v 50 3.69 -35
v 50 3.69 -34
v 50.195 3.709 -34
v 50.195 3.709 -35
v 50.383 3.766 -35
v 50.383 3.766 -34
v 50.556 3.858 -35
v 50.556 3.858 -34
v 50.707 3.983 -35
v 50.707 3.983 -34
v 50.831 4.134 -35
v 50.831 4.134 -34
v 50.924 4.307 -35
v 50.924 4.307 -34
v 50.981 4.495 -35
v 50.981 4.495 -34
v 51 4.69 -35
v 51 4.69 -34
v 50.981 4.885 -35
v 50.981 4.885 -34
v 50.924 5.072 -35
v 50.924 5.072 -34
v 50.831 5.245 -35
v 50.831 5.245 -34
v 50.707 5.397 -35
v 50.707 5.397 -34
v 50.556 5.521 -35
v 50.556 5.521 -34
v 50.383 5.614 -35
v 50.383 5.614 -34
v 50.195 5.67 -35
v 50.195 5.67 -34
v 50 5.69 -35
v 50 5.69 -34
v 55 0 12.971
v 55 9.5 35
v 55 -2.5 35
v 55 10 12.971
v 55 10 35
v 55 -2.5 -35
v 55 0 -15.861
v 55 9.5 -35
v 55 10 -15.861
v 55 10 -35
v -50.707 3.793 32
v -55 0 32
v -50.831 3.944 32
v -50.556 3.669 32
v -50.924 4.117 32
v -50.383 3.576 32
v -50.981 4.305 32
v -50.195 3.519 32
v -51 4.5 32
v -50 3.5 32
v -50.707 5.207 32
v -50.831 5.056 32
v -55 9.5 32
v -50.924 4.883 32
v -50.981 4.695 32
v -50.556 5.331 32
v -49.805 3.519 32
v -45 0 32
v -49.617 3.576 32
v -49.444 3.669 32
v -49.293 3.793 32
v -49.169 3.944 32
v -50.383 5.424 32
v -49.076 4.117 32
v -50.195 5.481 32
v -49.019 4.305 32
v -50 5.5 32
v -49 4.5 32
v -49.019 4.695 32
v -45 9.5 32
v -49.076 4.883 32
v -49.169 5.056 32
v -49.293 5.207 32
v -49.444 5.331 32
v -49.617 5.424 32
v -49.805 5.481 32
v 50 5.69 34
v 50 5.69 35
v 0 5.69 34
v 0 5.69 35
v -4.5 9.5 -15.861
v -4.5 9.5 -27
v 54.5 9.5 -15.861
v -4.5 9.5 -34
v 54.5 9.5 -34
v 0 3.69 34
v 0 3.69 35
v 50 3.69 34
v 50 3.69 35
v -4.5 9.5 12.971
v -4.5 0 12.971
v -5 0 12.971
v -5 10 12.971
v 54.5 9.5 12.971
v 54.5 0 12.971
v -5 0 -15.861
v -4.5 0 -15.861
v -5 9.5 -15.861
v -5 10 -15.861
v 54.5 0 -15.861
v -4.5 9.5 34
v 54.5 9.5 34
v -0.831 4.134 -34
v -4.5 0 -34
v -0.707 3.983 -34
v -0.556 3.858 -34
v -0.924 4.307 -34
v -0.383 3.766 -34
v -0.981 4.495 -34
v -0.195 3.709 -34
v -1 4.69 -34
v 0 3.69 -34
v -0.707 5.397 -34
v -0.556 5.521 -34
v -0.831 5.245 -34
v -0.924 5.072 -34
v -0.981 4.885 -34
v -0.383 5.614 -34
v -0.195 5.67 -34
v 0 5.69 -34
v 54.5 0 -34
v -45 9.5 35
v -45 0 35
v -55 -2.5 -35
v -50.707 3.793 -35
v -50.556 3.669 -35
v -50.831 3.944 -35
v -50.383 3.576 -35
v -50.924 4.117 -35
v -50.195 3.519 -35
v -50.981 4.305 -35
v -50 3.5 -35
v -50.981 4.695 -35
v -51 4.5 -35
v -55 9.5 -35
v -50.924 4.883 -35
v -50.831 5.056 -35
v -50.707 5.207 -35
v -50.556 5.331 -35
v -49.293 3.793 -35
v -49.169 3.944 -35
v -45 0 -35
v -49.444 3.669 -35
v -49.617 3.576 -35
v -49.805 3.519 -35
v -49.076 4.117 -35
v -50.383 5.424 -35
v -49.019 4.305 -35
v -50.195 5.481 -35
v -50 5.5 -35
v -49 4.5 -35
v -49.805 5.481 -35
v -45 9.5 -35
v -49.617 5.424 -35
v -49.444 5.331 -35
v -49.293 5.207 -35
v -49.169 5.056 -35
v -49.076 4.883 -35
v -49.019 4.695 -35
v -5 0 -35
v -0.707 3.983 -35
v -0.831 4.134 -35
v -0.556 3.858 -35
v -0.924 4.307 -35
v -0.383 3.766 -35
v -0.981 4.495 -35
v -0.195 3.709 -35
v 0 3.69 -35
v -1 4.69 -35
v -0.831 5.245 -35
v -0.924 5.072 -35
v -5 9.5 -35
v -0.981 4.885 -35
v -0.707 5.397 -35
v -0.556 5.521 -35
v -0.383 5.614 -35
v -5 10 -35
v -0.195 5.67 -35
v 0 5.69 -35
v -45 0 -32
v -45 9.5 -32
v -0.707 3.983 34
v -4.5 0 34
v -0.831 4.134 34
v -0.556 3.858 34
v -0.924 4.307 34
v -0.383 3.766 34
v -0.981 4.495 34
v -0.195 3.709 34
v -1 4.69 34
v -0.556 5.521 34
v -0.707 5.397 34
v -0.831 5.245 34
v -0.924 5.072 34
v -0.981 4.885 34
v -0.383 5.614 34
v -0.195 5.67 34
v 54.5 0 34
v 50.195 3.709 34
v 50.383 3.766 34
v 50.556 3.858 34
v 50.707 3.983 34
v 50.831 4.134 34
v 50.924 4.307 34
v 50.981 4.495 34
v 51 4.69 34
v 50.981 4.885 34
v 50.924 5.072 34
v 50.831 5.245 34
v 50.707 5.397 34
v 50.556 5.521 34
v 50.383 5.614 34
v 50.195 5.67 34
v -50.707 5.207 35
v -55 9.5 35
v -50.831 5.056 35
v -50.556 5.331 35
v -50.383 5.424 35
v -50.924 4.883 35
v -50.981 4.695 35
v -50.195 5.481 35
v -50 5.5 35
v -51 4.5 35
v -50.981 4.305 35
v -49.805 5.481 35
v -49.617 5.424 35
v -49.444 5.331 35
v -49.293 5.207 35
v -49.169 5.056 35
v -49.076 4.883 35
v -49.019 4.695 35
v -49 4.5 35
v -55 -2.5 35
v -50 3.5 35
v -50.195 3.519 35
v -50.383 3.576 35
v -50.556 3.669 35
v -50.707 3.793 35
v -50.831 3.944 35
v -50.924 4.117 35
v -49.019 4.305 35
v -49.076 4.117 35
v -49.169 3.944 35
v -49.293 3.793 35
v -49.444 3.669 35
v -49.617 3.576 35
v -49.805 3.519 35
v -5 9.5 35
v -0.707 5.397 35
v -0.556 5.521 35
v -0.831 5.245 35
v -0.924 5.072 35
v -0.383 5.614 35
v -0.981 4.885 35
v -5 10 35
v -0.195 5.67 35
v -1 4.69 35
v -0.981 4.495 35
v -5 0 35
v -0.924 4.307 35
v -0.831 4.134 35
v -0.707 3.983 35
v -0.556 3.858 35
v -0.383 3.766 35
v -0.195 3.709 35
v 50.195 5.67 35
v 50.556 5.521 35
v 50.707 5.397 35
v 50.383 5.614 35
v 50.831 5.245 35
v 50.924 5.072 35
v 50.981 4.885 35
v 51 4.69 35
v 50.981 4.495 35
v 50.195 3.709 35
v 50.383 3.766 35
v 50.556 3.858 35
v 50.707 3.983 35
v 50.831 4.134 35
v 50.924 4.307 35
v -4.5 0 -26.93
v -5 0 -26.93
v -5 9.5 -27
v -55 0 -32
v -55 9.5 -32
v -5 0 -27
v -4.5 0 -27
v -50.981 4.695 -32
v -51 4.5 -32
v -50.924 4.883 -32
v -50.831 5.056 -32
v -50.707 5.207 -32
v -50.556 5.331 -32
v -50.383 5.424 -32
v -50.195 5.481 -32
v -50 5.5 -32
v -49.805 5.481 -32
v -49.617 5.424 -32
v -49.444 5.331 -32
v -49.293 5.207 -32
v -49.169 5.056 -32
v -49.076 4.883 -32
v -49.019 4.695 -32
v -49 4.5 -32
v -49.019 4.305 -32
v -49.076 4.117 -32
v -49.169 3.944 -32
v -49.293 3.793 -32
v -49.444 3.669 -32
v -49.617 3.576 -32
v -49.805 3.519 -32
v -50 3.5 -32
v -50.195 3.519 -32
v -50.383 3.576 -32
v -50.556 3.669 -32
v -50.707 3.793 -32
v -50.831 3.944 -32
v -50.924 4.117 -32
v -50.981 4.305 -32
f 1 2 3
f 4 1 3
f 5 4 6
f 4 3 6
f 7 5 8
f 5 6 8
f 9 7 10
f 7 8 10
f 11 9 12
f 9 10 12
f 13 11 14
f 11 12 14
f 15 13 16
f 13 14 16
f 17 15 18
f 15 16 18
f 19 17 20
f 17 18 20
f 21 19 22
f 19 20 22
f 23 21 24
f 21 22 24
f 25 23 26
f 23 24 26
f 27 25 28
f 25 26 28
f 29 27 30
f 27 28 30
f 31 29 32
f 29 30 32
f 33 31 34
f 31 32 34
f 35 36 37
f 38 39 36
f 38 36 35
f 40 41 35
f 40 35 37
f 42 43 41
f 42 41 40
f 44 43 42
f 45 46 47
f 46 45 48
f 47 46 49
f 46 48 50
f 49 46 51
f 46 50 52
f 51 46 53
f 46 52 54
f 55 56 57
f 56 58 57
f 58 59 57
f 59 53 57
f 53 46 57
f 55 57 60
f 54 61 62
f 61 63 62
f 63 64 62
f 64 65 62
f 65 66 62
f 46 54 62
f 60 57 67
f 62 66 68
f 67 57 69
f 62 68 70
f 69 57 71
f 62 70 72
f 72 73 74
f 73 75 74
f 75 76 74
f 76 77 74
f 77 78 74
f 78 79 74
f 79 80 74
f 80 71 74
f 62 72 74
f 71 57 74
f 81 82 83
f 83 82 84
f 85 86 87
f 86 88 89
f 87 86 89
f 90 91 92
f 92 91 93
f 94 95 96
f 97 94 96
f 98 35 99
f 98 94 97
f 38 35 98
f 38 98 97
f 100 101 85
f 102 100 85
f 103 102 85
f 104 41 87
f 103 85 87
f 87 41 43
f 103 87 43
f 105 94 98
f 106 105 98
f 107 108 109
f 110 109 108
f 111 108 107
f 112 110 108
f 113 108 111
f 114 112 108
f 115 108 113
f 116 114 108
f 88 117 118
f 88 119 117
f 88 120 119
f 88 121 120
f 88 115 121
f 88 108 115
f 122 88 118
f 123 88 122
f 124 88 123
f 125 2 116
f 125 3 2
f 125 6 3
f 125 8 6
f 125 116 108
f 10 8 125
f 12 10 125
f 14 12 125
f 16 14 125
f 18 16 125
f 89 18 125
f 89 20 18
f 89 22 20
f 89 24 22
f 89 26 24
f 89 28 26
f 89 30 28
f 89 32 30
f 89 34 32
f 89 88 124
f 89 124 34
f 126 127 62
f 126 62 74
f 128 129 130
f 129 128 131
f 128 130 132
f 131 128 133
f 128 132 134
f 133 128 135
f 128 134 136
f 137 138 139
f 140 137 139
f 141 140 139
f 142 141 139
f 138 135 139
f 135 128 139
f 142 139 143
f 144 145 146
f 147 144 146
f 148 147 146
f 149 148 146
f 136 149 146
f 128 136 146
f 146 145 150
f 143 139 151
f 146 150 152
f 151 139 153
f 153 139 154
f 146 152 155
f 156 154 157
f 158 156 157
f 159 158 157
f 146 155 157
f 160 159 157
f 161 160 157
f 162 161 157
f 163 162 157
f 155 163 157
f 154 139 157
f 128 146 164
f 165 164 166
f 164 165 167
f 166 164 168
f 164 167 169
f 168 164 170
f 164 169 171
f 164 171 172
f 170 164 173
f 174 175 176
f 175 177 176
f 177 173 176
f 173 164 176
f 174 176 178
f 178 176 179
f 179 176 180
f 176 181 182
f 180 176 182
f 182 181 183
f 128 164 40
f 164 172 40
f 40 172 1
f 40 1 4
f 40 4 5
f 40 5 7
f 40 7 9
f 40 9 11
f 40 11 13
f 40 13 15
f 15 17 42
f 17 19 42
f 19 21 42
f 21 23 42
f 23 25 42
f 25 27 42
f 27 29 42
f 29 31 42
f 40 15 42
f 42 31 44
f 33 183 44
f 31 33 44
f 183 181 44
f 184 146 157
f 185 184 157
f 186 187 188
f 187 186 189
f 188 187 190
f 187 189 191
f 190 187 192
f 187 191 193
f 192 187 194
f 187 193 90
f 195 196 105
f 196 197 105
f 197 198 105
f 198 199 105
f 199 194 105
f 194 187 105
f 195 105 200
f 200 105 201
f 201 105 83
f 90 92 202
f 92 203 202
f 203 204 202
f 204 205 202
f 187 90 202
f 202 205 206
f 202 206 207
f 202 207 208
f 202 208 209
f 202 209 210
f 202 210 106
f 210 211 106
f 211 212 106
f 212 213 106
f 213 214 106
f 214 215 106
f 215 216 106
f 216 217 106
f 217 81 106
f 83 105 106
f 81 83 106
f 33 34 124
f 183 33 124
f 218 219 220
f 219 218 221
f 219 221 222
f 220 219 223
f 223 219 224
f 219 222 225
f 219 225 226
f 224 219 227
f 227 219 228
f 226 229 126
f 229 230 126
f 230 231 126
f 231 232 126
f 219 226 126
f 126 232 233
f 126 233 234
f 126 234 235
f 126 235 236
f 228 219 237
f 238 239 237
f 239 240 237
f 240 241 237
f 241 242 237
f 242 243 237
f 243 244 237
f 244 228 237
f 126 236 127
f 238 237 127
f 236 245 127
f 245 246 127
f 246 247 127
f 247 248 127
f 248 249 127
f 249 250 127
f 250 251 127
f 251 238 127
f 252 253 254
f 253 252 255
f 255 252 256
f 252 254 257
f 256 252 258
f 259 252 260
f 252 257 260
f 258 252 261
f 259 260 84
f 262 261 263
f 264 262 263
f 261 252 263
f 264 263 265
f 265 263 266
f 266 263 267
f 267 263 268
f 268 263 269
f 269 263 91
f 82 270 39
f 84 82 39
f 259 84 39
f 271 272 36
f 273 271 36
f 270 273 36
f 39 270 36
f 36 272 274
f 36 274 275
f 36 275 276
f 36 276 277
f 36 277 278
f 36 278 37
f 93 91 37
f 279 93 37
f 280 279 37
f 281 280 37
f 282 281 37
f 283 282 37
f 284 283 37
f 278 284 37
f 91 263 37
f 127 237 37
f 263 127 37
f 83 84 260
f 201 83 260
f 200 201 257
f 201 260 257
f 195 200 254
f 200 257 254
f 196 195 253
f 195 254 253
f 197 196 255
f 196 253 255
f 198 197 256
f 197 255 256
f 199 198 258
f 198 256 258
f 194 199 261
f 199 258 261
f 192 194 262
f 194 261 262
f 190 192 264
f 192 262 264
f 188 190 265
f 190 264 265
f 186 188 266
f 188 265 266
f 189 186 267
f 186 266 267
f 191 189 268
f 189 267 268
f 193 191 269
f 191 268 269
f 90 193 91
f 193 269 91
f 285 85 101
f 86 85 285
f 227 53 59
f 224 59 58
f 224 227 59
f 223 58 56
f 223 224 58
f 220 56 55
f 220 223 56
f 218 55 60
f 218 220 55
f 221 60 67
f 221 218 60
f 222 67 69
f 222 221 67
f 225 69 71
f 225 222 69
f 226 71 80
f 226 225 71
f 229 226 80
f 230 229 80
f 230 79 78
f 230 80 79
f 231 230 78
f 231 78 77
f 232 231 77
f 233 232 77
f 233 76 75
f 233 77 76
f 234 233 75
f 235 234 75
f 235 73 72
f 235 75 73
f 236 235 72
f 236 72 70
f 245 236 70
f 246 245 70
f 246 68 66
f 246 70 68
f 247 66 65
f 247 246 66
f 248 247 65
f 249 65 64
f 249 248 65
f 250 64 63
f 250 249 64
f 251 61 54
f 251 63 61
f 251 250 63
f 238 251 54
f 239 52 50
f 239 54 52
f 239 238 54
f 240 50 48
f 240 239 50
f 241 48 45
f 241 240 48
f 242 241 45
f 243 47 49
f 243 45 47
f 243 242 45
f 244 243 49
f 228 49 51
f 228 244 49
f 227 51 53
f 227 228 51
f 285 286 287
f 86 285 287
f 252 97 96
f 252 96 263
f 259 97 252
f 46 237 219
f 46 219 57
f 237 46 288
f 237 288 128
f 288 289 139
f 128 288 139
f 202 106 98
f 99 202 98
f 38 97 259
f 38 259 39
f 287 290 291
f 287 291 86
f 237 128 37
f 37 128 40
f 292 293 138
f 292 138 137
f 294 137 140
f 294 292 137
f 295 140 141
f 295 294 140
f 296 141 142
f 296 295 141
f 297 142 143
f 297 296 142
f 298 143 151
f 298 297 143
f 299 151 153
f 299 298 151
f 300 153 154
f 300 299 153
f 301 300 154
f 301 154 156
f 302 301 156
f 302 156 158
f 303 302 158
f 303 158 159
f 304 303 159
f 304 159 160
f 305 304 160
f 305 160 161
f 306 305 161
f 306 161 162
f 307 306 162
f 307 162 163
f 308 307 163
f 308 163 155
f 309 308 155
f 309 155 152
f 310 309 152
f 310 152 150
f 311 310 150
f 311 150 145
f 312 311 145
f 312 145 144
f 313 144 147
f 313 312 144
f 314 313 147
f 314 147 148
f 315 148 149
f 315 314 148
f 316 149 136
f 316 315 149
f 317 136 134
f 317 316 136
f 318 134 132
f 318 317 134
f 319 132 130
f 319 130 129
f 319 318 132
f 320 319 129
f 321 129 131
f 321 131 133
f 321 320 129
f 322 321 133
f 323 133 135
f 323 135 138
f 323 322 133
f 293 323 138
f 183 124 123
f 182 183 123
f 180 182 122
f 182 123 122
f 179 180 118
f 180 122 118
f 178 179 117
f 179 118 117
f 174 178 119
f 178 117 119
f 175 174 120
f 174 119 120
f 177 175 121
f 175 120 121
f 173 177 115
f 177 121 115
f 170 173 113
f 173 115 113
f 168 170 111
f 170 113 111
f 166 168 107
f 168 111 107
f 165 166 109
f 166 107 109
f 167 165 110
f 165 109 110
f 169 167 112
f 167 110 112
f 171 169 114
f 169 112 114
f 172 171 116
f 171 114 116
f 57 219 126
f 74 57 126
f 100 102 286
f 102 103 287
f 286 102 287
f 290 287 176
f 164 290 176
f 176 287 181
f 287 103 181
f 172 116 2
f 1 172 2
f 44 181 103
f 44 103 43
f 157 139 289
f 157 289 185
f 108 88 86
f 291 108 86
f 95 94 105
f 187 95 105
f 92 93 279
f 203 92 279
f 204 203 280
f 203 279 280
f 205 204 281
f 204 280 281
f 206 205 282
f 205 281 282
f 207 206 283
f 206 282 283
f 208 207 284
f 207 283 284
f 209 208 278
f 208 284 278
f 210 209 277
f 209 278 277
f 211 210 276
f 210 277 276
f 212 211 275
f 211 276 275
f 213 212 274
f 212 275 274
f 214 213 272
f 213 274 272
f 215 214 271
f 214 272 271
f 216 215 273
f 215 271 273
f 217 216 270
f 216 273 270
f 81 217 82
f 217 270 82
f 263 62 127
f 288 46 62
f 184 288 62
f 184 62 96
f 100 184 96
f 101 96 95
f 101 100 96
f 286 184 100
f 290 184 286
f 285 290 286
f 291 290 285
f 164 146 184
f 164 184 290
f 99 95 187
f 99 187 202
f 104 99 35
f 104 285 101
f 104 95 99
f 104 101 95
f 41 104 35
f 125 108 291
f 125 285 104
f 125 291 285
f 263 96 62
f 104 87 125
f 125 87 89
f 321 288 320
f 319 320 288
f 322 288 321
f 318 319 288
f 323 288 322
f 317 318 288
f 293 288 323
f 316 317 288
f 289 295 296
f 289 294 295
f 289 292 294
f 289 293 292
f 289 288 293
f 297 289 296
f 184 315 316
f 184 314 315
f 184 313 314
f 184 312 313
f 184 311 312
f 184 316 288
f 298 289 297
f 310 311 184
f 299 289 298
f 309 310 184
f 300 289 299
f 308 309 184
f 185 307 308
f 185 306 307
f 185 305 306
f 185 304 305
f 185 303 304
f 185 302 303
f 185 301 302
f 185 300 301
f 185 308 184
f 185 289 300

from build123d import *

# Parameters (mm, degrees)
SKETCH1_W             = 110
SKETCH1_H             = 70
BOSS_EXTRUDE1_DEPTH   = 2.5
SKETCH2_W             = 60
SKETCH2_H             = 12
BOSS_EXTRUDE2_DEPTH   = 1
SKETCH3_W             = 10
SKETCH3_H             = 12
BOSS_EXTRUDE3_DEPTH   = 3
SKETCH5_W             = 8
SKETCH5_H             = 9.5
BOSS_EXTRUDE4_DEPTH   = 0.5
SKETCH5_W_2           = 7
BOSS_EXTRUDE4_2_DEPTH = 0.5
SKETCH6_W             = 8
SKETCH6_H             = 9.5
SKETCH6_W_2           = 7
BOSS_EXTRUDE5_DEPTH   = 0.5
SKETCH7_W             = 60
SKETCH7_H             = 22.029201989
SKETCH7_H_2           = 19.138894139
BOSS_EXTRUDE6_DEPTH   = 0.5
CUT_EXTRUDE1_START    = -70
CUT_EXTRUDE1_DEPTH    = 70
CUT_EXTRUDE2_START    = -70
SKETCH11_R            = 1
CUT_EXTRUDE2_DEPTH    = 70
SKETCH12_W            = 13.029201989
SKETCH12_H            = 9.5
BOSS_EXTRUDE7_DEPTH   = 0.5
SKETCH13_W            = 13.029201989
SKETCH13_H            = 9.5
SKETCH13_W_2          = 11.138894139
BOSS_EXTRUDE8_DEPTH   = 0.5


with BuildPart() as part:
    # Sketch1 → Boss-Extrude1 (new body)
    with BuildSketch(Plane(origin=(0, 0, 0), x_dir=(1, 0, 0), z_dir=(0, 1, 0))):
        Rectangle(SKETCH1_W, SKETCH1_H)
    extrude(amount=-BOSS_EXTRUDE1_DEPTH)

    # Sketch2 → Boss-Extrude2 (add)
    with BuildSketch(Plane.XY.offset(35)):
        with Locations((25, 3.5)):
            Rectangle(SKETCH2_W, SKETCH2_H)
    boss_extrude2 = extrude(amount=-BOSS_EXTRUDE2_DEPTH)

    # Mirror1: Boss-Extrude2 across plane
    add(boss_extrude2.mirror(Plane.XY))

    # Sketch3 → Boss-Extrude3 (add)
    with BuildSketch(Plane.XY.offset(35)):
        with Locations((-50, 3.5)):
            Rectangle(SKETCH3_W, SKETCH3_H)
    boss_extrude3 = extrude(amount=-BOSS_EXTRUDE3_DEPTH)

    # Mirror2: Boss-Extrude3 across plane
    add(boss_extrude3.mirror(Plane.XY))

    # Sketch6 → Boss-Extrude5 (add)
    with BuildSketch(Plane.ZY.offset(5)):
        with Locations((30, 4.75)):
            Rectangle(SKETCH6_W, SKETCH6_H)
        with Locations((-30.5, 4.75)):
            Rectangle(SKETCH6_W_2, SKETCH6_H)
    extrude(amount=-BOSS_EXTRUDE5_DEPTH)



with BuildPart() as body_2:
    # Sketch5 → Boss-Extrude4 (new body)
    with BuildSketch(Plane(origin=(55, 0, 0), x_dir=(0, 0, -1), z_dir=(1, 0, 0))):
        with Locations((-30, 4.75)):
            Rectangle(SKETCH5_W, SKETCH5_H)
    extrude(amount=-BOSS_EXTRUDE4_DEPTH)


with BuildPart() as body_3:
    # Sketch5 → Boss-Extrude4 2 (new body)
    with BuildSketch(Plane(origin=(55, 0, 0), x_dir=(0, 0, -1), z_dir=(1, 0, 0))):
        with Locations((30.5, 4.75)):
            Rectangle(SKETCH5_W_2, SKETCH5_H)
    extrude(amount=-BOSS_EXTRUDE4_2_DEPTH)


with BuildPart() as part_1:
    add(part.part)

    add(body_2.part)  # Boss-Extrude6 merges body 2

    add(body_3.part)  # Boss-Extrude6 merges body 3
    # Sketch7 → Boss-Extrude6 (add)
    with BuildSketch(Plane(origin=(0, 9.5, 0), x_dir=(1, 0, 0), z_dir=(0, 1, 0))):
        with Locations((25, -23.985399005)):
            Rectangle(SKETCH7_W, SKETCH7_H)
        with Locations((25, 25.43055293)):
            Rectangle(SKETCH7_W, SKETCH7_H_2)
    extrude(amount=BOSS_EXTRUDE6_DEPTH)

    # Sketch10 → Cut-Extrude1 (cut)
    with BuildSketch(Plane(origin=(0, 0, -35), x_dir=(-1, 0, 0), z_dir=(0, 0, -1)).offset(CUT_EXTRUDE1_START)):
        with BuildLine():
            Line((0, 3.689665026), (-50, 3.689665026))
            ThreePointArc((-50, 3.689665026), (-51, 4.689665026), (-50, 5.689665026))
            Line((-50, 5.689665026), (0, 5.689665026))
            ThreePointArc((0, 5.689665026), (1, 4.689665026), (0, 3.689665026))
        make_face()
    extrude(amount=CUT_EXTRUDE1_DEPTH, mode=Mode.SUBTRACT)

    # Sketch11 → Cut-Extrude2 (cut)
    with BuildSketch(Plane(origin=(0, 0, -35), x_dir=(-1, 0, 0), z_dir=(0, 0, -1)).offset(CUT_EXTRUDE2_START)):
        with Locations((50, 4.5)):
            Circle(SKETCH11_R)
    extrude(amount=CUT_EXTRUDE2_DEPTH, mode=Mode.SUBTRACT)

    # Sketch12 → Boss-Extrude7 (add)
    with BuildSketch(Plane.ZY.offset(5)):
        Polygon((-15.861105861, 9.5), (-15.861105861, 0), (-26.92969018, 0), (-27, 9.5), align=None)
        with Locations((19.485399005, 4.75)):
            Rectangle(SKETCH12_W, SKETCH12_H)
    extrude(amount=-BOSS_EXTRUDE7_DEPTH)

    # Sketch13 → Boss-Extrude8 (add)
    with BuildSketch(Plane(origin=(55, 0, 0), x_dir=(0, 0, -1), z_dir=(1, 0, 0))):
        with Locations((-19.485399005, 4.75)):
            Rectangle(SKETCH13_W, SKETCH13_H)
        with Locations((21.43055293, 4.75)):
            Rectangle(SKETCH13_W_2, SKETCH13_H)
    extrude(amount=-BOSS_EXTRUDE8_DEPTH)


solid = part_1.part
